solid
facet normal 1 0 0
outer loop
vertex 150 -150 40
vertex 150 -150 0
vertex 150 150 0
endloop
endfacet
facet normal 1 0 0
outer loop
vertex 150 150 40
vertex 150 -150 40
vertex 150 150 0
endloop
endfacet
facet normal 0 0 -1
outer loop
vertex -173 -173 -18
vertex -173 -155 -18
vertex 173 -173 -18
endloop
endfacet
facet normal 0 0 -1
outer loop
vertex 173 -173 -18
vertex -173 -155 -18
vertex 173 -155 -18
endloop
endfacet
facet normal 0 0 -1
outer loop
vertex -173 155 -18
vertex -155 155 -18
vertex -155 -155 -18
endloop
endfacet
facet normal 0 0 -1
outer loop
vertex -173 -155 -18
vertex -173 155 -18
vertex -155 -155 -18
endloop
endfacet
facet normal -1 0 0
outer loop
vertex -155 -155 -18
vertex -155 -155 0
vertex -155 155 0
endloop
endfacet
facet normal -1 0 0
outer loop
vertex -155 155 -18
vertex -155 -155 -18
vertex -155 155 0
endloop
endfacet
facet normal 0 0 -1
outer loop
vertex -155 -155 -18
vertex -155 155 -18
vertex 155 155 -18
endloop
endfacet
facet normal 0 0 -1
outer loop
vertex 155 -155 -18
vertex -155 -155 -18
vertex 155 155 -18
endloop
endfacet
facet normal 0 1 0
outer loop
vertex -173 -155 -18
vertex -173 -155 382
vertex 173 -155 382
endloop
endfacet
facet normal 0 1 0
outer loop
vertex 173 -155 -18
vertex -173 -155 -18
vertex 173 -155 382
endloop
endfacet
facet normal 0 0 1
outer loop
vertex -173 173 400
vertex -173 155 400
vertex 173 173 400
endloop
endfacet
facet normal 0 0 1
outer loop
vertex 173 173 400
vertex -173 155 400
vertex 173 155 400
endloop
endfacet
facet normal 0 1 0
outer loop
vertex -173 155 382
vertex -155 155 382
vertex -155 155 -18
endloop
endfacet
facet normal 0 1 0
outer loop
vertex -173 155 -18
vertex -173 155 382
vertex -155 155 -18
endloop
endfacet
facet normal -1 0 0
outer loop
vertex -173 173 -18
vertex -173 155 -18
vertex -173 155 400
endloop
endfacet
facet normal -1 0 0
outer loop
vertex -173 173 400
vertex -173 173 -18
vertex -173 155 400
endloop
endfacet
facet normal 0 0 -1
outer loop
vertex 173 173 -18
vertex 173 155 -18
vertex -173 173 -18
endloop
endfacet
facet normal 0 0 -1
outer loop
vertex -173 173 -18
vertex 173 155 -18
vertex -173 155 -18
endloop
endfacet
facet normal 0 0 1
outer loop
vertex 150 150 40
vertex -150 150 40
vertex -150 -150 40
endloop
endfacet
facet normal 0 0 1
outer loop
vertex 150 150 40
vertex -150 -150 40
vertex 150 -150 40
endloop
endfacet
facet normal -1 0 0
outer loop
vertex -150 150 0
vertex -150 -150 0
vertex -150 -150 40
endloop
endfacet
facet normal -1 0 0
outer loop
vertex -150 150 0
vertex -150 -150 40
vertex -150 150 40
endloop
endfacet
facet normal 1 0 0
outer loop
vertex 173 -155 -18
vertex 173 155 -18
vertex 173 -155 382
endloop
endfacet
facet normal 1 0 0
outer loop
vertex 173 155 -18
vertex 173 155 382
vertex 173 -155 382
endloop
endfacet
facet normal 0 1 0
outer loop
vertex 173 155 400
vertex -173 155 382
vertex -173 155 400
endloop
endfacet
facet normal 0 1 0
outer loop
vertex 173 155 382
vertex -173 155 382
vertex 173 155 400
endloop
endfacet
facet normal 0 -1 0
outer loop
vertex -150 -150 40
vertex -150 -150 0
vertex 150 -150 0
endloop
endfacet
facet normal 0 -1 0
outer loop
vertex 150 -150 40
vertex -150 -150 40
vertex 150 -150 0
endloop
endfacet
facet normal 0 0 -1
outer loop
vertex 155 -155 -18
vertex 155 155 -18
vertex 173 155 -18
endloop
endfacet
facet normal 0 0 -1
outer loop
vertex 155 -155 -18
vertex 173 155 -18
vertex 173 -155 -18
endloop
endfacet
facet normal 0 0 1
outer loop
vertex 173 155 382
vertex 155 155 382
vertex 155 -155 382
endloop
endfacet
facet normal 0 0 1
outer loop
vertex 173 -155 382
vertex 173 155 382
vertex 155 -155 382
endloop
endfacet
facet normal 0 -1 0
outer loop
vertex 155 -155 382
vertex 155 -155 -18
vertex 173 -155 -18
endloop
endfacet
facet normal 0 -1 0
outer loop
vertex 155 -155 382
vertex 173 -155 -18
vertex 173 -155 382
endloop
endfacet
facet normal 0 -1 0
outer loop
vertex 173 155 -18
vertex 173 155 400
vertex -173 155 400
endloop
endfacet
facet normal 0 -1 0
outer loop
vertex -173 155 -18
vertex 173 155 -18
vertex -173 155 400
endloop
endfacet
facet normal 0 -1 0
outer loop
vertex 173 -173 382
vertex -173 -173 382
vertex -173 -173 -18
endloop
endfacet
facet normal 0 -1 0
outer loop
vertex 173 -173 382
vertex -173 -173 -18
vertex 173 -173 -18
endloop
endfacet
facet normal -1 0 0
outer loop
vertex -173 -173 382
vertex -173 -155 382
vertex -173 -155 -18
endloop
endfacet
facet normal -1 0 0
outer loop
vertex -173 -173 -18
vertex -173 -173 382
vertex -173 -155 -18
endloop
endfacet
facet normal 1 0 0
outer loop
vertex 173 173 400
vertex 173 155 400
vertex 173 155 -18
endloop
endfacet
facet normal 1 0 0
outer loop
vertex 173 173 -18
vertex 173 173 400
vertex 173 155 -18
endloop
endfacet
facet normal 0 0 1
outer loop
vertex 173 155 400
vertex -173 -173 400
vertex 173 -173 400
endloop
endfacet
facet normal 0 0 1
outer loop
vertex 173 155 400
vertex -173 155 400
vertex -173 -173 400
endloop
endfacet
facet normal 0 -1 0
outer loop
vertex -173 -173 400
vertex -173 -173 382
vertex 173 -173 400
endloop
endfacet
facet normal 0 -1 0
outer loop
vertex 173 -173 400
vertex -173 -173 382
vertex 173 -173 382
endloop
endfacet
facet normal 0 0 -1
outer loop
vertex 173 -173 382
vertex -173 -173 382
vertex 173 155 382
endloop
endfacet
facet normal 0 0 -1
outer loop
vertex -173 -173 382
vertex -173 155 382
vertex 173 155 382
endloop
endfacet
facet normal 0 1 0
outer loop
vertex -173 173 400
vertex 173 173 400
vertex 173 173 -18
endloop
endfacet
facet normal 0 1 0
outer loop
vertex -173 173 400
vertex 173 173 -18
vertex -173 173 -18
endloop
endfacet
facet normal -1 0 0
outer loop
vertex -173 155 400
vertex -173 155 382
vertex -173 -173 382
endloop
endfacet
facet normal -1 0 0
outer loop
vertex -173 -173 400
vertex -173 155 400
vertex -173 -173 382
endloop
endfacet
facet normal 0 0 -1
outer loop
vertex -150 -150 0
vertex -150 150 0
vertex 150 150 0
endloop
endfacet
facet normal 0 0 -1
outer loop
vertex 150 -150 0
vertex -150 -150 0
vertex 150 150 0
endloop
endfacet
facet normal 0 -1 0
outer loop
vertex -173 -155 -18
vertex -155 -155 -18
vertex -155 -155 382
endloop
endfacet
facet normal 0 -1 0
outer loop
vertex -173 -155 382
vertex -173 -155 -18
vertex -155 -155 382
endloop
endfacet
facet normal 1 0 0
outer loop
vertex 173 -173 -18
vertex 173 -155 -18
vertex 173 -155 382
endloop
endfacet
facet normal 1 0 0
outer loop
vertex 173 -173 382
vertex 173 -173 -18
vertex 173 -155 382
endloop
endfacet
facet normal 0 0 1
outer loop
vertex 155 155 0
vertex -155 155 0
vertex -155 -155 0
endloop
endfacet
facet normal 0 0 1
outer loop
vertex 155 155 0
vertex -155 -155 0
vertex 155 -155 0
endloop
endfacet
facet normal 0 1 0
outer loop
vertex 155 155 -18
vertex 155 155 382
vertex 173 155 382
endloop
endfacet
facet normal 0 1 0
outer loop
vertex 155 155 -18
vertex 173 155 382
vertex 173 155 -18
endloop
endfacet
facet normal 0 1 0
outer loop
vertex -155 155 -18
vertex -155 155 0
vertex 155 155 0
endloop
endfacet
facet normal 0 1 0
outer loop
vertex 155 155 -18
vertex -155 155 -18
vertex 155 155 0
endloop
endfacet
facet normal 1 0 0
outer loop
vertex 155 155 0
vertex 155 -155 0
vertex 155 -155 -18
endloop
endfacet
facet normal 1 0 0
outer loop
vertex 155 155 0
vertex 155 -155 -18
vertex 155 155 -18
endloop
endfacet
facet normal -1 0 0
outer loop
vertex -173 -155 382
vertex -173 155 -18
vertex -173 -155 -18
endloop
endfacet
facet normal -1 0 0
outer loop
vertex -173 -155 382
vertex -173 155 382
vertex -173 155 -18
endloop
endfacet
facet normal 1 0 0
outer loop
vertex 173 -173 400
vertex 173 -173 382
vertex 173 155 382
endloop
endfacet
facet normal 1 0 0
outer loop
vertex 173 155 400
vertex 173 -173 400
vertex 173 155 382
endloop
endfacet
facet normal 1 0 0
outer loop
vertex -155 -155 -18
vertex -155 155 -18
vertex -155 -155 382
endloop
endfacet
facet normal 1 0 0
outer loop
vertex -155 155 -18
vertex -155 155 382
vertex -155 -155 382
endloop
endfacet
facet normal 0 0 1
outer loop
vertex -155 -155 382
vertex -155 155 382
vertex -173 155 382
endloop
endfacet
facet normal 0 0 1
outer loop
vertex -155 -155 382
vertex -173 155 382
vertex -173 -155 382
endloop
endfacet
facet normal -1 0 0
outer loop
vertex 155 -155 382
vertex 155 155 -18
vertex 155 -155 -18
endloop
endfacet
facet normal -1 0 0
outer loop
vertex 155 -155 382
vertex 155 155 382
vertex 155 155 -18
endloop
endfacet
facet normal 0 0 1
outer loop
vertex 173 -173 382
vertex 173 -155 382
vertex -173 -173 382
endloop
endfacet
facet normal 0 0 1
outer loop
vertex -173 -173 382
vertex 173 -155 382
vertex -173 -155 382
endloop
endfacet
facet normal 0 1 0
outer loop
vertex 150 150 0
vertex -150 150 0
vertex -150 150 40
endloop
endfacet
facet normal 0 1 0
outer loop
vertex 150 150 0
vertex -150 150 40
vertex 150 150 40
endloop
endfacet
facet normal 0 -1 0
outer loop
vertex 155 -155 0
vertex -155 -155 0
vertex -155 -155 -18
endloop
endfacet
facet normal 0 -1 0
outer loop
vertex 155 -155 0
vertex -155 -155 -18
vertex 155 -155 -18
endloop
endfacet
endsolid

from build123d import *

# Parameters (mm, degrees)
F0_W      = 300
F0_H      = 300
F1_DEPTH  = 40
F0_W_2    = 310
F0_H_2    = 310
F2_DEPTH  = 18
F3_W      = 310
F3_H      = 18
F3_H_2    = 382
F4_DEPTH  = 18
F6_W      = 310
F6_H      = 18
F7_DEPTH  = 18
F8_W      = 346
F8_H      = 18
F8_H_2    = 310
F9_DEPTH  = 18
F10_W     = 18
F10_H     = 400
F11_DEPTH = 18


with BuildPart() as f1:
    # F0 (on Top) → F1 (new body)
    with BuildSketch(Plane.XY):
        Rectangle(F0_W, F0_H)
    extrude(amount=F1_DEPTH)


with BuildPart() as f2:
    # F0 (on Top) → F2 (new body)
    with BuildSketch(Plane.XY):
        Rectangle(F0_W_2, F0_H_2)
        Rectangle(F0_W, F0_H, mode=Mode.SUBTRACT)
        Rectangle(F0_W, F0_H)
    extrude(amount=-F2_DEPTH)


with BuildPart() as f4:
    # F3 (on face) → F4 (new body)
    with BuildSketch(Plane(origin=(-155, 0, 0), x_dir=(0, -1, 0), z_dir=(-1, 0, 0))):
        with Locations((0, -9)):
            Rectangle(F3_W, F3_H)
        with Locations((0, 191)):
            Rectangle(F3_W, F3_H_2)
    extrude(amount=F4_DEPTH)


with BuildPart() as f5_1:
    # F5: instance of F4
    add(f4.part.mirror(Plane.YZ))


with BuildPart() as f7:
    # F6 (on face) → F7 (new body)
    with BuildSketch(Plane.XZ.offset(155)):
        Polygon((-173, 382), (-173, -18), (-155, -18), (-155, 0), (155, 0), (155, -18), (173, -18), (173, 382), align=None)
        with Locations((0, -9)):
            Rectangle(F6_W, F6_H)
    extrude(amount=F7_DEPTH)


with BuildPart() as f9:
    # F8 (on face) → F9 (new body)
    with BuildSketch(Plane.XY.offset(382)):
        with Locations((0, -164)):
            Rectangle(F8_W, F8_H)
        Rectangle(F8_W, F8_H_2)
    extrude(amount=F9_DEPTH)


with BuildPart() as f11:
    # F10 (on face) → F11 (new body)
    with BuildSketch(Plane(origin=(0, 155, 0), x_dir=(-1, 0, 0), z_dir=(0, 1, 0))):
        with Locations((164, 182)):
            Rectangle(F10_W, F10_H)
        Polygon((-173, -18), (155, -18), (155, 382), (173, 382), (173, 400), (-173, 400), align=None)
    extrude(amount=F11_DEPTH)


solid = Compound([f1.part, f2.part, f4.part, f5_1.part, f7.part, f9.part, f11.part])
